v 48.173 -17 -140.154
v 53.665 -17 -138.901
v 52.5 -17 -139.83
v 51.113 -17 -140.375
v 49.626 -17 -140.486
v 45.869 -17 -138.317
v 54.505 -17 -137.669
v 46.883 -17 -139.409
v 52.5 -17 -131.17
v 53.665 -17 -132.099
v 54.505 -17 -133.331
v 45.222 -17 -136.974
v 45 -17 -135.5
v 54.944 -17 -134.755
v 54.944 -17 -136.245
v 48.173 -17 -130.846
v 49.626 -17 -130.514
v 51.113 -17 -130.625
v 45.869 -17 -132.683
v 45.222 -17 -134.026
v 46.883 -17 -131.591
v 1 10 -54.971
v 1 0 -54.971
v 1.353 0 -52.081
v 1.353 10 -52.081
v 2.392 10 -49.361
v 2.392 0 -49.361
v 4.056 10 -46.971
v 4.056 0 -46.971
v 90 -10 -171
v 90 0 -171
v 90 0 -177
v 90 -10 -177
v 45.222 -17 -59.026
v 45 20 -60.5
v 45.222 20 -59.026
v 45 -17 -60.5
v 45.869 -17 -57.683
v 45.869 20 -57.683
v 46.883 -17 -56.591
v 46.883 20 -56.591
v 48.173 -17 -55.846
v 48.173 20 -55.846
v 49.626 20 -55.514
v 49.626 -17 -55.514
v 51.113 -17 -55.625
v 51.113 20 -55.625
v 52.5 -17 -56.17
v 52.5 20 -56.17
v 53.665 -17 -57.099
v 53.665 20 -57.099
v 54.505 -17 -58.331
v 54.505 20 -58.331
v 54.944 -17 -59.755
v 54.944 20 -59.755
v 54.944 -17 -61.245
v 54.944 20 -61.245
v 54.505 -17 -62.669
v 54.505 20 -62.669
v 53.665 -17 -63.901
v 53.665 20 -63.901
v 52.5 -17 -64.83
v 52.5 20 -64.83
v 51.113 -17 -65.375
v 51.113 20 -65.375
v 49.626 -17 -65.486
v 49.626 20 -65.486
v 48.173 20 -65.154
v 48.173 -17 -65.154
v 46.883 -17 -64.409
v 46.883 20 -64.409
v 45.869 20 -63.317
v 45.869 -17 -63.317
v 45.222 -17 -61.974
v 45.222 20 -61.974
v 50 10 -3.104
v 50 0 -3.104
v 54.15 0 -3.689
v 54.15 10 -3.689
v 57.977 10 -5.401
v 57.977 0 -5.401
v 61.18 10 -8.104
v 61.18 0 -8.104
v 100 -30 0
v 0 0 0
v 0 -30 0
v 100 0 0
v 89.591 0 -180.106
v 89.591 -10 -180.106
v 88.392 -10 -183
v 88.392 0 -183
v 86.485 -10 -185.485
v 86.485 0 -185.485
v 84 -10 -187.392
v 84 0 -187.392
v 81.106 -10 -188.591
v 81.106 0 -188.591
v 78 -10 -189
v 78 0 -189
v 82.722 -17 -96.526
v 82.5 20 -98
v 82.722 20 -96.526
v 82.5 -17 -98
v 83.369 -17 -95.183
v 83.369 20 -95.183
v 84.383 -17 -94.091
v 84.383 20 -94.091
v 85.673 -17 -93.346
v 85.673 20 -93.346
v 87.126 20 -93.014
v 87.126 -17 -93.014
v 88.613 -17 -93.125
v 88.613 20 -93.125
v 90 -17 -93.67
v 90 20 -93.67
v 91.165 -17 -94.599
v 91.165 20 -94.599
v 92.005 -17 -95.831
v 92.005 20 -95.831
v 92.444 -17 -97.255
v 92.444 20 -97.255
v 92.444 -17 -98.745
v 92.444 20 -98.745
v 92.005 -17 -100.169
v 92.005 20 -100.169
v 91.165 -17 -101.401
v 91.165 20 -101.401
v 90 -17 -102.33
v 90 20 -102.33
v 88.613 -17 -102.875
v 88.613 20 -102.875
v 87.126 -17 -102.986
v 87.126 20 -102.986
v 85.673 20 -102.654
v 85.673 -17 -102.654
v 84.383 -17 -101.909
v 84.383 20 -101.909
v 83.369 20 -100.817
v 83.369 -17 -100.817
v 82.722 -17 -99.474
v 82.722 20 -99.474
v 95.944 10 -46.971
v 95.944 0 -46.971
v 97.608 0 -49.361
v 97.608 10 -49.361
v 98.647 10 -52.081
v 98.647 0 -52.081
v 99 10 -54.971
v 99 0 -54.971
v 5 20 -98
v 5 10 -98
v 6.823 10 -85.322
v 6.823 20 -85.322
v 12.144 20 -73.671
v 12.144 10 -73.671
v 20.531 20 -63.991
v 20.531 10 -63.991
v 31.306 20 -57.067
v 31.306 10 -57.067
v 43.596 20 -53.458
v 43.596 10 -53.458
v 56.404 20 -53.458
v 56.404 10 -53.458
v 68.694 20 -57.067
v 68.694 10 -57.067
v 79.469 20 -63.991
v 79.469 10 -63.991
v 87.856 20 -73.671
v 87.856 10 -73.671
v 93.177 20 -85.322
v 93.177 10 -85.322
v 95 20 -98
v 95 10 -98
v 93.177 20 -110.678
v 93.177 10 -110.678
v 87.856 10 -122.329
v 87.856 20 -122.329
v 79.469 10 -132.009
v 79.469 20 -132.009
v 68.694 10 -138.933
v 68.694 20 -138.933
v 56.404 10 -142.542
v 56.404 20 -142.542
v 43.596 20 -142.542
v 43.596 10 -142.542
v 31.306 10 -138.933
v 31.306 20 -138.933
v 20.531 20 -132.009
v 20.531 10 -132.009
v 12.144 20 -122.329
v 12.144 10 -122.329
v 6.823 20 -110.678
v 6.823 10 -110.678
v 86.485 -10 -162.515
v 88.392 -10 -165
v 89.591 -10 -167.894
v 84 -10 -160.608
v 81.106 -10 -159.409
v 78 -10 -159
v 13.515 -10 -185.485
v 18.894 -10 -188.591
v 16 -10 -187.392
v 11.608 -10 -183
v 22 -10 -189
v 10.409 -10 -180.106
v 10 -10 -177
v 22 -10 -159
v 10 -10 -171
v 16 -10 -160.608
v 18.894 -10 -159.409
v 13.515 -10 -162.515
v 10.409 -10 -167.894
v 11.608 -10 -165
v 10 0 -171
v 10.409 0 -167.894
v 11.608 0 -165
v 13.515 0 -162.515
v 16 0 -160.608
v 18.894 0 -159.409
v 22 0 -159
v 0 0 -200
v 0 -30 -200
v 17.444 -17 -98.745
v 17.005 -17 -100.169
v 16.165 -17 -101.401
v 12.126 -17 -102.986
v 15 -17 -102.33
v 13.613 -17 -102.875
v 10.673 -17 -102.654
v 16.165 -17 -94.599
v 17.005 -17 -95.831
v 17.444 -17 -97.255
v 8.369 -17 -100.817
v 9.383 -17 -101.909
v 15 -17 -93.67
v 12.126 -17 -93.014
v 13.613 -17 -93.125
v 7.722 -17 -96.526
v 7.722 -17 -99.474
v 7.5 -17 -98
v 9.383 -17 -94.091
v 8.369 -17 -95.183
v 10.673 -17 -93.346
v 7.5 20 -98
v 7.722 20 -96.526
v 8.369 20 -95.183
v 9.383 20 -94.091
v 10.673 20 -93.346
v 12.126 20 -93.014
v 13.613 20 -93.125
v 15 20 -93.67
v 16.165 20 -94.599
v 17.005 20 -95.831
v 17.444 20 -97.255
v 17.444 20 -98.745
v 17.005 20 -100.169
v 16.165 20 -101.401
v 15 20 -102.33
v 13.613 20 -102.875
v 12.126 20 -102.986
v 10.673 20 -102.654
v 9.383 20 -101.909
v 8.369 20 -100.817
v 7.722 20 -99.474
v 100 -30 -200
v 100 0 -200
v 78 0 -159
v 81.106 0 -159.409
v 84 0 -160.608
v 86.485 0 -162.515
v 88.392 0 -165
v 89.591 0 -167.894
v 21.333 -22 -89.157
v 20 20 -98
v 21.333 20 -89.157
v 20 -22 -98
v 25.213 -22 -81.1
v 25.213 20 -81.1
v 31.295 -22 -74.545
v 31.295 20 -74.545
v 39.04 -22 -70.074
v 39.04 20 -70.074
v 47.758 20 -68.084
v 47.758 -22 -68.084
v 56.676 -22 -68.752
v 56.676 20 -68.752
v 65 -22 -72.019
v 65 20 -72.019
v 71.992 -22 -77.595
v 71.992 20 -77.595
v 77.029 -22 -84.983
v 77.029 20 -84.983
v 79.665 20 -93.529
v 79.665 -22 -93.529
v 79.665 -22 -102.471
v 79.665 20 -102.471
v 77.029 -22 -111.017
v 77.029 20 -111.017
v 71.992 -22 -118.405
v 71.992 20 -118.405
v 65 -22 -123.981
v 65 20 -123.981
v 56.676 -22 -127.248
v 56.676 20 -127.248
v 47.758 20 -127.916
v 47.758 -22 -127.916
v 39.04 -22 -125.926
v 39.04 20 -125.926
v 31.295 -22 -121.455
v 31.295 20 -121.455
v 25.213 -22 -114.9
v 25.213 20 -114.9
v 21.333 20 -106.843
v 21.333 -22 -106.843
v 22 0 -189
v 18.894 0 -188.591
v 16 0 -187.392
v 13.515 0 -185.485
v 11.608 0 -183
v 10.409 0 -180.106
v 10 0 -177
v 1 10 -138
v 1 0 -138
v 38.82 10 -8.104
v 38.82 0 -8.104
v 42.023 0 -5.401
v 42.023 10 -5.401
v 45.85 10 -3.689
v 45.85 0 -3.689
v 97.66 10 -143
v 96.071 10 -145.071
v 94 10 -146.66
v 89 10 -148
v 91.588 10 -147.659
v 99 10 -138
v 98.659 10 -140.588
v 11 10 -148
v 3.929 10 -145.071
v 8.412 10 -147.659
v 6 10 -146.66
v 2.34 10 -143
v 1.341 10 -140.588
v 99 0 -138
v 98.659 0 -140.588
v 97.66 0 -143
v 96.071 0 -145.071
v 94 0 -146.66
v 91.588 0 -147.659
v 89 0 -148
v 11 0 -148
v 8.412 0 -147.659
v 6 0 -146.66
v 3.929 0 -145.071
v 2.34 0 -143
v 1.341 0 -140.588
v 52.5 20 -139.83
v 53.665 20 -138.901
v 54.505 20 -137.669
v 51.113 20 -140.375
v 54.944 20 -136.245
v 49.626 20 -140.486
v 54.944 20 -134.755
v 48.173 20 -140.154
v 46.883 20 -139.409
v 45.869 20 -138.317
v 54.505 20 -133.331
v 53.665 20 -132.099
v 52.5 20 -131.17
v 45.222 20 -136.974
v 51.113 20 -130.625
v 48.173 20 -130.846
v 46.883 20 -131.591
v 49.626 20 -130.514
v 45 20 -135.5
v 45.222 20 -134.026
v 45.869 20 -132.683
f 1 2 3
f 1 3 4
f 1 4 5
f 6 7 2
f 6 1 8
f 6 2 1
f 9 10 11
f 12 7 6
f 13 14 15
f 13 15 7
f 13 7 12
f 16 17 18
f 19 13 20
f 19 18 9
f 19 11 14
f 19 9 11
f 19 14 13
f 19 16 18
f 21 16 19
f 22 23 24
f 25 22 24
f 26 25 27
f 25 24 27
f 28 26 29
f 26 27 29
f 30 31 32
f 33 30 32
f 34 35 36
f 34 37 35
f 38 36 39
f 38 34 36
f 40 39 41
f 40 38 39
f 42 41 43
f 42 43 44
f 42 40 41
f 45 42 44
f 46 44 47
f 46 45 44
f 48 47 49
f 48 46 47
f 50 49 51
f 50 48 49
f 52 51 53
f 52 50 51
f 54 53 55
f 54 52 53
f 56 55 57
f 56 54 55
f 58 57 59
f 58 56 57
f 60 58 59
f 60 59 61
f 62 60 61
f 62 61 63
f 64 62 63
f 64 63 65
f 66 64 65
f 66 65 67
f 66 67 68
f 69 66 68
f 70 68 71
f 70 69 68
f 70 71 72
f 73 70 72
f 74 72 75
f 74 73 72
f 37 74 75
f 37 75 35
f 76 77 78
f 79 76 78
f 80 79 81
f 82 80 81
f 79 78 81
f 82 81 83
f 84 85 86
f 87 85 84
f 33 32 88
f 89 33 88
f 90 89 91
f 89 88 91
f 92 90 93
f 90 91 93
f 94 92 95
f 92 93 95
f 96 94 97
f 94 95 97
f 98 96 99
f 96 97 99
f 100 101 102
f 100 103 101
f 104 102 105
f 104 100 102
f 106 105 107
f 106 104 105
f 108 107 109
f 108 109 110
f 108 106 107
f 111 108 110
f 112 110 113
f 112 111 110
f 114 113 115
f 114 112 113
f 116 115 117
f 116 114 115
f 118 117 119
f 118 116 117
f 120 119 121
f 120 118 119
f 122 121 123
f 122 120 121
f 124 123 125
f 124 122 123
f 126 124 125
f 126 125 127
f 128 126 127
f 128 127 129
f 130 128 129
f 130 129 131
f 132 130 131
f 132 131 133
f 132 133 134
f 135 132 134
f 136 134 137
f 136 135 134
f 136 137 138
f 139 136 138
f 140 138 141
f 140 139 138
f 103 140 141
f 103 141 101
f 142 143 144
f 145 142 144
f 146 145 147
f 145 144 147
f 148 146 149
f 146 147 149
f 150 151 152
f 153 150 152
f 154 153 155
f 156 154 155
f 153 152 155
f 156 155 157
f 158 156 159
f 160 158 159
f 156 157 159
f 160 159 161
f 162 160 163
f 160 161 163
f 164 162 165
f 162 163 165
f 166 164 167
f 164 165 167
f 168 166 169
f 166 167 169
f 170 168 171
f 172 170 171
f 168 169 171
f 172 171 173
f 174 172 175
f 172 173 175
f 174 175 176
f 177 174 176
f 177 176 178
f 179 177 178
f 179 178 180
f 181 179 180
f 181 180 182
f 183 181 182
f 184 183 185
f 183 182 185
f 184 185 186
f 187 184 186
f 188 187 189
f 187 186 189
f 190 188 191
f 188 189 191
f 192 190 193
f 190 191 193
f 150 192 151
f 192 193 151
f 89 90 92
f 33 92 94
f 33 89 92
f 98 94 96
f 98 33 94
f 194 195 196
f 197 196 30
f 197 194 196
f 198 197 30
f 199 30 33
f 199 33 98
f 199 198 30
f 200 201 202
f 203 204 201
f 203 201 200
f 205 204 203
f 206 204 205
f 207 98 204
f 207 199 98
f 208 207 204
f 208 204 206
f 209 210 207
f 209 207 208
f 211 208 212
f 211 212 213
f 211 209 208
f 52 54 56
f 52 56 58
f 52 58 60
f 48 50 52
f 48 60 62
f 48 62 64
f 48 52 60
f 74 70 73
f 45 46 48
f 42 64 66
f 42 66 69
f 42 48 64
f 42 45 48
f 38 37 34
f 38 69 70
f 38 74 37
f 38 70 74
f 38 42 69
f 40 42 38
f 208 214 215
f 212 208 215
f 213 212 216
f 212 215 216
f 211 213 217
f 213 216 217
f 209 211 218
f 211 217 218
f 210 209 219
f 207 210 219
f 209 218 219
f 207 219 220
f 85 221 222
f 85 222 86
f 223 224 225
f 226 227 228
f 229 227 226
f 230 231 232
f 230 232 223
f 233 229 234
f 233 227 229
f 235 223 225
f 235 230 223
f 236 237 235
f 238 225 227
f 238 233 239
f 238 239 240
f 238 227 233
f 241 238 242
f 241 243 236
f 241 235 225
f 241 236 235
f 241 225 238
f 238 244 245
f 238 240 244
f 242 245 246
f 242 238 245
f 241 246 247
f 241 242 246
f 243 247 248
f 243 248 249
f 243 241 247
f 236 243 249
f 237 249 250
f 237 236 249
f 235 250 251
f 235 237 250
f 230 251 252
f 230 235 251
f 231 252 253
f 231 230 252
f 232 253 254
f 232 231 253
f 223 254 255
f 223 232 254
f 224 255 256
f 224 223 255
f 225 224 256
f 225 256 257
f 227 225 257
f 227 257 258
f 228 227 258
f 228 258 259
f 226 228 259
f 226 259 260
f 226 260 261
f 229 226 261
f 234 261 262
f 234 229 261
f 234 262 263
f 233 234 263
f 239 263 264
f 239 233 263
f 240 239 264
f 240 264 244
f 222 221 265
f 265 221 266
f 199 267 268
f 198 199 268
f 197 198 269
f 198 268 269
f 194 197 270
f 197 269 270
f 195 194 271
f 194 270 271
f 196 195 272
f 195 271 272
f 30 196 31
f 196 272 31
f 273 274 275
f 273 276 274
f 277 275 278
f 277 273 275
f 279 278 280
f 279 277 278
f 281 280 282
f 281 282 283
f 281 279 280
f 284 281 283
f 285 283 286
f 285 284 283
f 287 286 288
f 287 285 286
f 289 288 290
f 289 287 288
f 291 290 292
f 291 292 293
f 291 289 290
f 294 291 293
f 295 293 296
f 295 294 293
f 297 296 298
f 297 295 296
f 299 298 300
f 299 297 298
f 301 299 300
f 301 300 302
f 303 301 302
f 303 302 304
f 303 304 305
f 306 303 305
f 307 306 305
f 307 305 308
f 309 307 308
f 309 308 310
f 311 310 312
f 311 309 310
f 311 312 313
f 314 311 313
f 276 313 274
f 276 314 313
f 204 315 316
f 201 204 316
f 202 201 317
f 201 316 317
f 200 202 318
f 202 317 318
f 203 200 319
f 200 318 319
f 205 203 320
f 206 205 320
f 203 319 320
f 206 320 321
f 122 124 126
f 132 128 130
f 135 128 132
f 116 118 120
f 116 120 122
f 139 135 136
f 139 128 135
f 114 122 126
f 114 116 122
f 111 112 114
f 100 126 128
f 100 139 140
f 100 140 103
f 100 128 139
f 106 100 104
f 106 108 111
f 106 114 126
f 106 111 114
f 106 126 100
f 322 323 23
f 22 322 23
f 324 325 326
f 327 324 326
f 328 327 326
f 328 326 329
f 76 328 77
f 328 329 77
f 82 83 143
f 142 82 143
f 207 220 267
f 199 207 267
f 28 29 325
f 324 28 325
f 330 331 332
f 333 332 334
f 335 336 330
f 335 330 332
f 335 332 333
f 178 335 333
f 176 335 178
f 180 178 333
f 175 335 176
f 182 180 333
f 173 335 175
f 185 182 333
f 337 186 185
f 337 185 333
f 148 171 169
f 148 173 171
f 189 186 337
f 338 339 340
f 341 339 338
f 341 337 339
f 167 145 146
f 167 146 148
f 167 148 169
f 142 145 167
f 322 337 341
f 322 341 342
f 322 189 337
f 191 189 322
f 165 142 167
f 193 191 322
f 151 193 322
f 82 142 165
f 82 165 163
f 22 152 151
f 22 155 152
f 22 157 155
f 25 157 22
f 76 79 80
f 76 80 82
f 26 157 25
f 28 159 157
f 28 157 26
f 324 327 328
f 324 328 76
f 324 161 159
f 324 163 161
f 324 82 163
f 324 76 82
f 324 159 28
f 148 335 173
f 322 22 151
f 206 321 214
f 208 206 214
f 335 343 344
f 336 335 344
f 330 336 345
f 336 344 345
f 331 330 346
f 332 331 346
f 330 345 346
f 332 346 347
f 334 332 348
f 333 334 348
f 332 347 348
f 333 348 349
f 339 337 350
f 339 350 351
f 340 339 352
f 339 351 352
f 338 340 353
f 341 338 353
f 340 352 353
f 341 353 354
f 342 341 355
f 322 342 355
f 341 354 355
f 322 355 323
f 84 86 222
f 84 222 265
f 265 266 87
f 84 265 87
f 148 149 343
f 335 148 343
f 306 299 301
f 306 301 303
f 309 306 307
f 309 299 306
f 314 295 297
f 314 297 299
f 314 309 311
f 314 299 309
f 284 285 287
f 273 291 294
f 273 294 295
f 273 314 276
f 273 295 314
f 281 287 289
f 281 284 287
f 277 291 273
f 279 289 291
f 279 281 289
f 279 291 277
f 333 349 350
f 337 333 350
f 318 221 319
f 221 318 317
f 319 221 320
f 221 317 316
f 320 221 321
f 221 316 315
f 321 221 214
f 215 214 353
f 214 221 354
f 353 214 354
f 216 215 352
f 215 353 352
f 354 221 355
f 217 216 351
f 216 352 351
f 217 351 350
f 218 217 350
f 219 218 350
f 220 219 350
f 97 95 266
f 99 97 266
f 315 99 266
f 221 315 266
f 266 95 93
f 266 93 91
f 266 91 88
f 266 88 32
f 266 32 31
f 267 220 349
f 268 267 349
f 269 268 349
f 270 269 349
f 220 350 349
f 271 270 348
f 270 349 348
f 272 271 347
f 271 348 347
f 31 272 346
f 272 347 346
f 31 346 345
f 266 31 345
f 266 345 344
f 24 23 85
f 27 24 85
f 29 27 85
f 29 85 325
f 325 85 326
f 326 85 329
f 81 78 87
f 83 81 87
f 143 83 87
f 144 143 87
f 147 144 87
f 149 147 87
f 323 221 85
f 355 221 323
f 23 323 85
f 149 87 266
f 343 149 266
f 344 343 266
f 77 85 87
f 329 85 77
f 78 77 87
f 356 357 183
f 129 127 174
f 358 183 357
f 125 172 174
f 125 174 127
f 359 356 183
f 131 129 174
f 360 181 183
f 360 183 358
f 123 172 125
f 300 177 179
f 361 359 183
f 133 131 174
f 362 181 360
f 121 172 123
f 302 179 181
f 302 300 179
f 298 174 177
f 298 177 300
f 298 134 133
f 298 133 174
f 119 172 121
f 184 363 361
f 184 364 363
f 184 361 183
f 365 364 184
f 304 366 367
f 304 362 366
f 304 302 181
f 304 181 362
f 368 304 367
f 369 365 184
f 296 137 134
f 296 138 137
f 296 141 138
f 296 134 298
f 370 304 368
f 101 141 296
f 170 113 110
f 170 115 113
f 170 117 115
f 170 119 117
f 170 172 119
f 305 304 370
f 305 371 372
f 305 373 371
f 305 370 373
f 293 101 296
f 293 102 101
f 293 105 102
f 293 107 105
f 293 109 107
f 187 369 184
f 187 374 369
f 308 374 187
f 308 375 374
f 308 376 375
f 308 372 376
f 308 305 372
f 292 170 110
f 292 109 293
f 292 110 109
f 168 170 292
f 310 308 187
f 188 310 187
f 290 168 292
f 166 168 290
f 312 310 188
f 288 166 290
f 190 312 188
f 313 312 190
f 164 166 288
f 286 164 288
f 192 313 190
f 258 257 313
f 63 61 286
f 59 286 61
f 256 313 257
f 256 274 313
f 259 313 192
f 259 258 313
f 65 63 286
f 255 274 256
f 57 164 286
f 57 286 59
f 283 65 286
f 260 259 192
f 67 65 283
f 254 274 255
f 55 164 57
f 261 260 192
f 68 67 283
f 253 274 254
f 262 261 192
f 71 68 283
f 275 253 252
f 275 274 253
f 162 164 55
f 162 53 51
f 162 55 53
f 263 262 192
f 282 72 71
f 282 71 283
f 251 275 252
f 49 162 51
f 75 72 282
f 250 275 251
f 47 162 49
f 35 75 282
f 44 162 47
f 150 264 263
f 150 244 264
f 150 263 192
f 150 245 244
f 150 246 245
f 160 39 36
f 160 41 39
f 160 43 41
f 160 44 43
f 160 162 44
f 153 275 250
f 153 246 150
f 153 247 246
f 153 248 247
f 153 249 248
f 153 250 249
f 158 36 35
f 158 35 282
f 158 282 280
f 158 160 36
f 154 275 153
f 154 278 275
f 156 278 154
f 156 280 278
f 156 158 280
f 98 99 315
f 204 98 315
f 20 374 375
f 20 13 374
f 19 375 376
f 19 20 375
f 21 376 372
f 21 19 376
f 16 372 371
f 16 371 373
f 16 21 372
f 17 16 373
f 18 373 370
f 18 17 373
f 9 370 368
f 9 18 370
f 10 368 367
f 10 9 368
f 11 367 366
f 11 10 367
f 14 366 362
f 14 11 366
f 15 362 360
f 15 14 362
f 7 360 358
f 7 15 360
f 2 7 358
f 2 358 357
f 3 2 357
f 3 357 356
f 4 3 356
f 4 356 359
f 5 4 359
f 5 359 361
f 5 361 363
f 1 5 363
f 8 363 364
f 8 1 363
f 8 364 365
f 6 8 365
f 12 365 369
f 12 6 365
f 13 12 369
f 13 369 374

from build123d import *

# Parameters (mm, degrees)
F0_W     = 100
F0_H     = 200
F1_DEPTH = 30
F3_DEPTH = 10
F4_R     = 45
F4_R_2   = 5
F4_R_3   = 30
F5_DEPTH = 10
F6_DEPTH = 27
F7_DEPTH = 32
F9_DEPTH = 10


with BuildPart() as f1:
    # F0 (on Front) → F1 (new body)
    with BuildSketch(Plane.XZ):
        with Locations((50, -100)):
            Rectangle(F0_W, F0_H)
    extrude(amount=F1_DEPTH)

    # F2 (on face) → F3 (join)
    with BuildSketch(Plane(origin=(0, 0, 0), x_dir=(-1, 0, 0), z_dir=(0, 1, 0))):
        with BuildLine():
            ThreePointArc((-38.8196601125, -8.1037424163), (-43.876275643, -4.4106784786), (-50, -3.1037424163))
            ThreePointArc((-50, -3.1037424163), (-56.123724357, -4.4106784786), (-61.1803398875, -8.1037424163))
            Line((-61.1803398875, -8.1037424163), (-95.94427191, -46.971))
            ThreePointArc((-95.94427191, -46.971), (-98.2100683076, -50.6891349227), (-99, -54.971))
            Line((-99, -54.971), (-99, -138))
            ThreePointArc((-99, -138), (-96.0710678119, -145.0710678119), (-89, -148))
            Line((-89, -148), (-50, -148))
            Line((-50, -148), (-11, -148))
            ThreePointArc((-11, -148), (-3.9289321881, -145.0710678119), (-1, -138))
            Line((-1, -138), (-1, -54.971))
            ThreePointArc((-1, -54.971), (-1.7899316924, -50.6891349227), (-4.05572809, -46.971))
            Line((-4.05572809, -46.971), (-38.8196601125, -8.1037424163))
        make_face()
    extrude(amount=F3_DEPTH)

    # F4 (on face) → F5 (join)
    with BuildSketch(Plane(origin=(0, 10, 0), x_dir=(-1, 0, 0), z_dir=(0, 1, 0))):
        with Locations((-50, -98)):
            Circle(F4_R)
        with Locations((-50, -135.5)):
            Circle(F4_R_2, mode=Mode.SUBTRACT)
        with Locations((-87.5, -98)):
            Circle(F4_R_2, mode=Mode.SUBTRACT)
        with Locations((-50, -98)):
            Circle(F4_R_3, mode=Mode.SUBTRACT)
        with Locations((-12.5, -98)):
            Circle(F4_R_2, mode=Mode.SUBTRACT)
        with Locations((-50, -60.5)):
            Circle(F4_R_2, mode=Mode.SUBTRACT)
    extrude(amount=F5_DEPTH)

    # F6 (cut): faces of the model
    f6_faces = [f1.faces().sort_by_distance(p)[0] for p in [
        (50, 10, -135.5),
        (87.5, 10, -98),
        (50, 10, -60.5),
        (12.5, 10, -98),
    ]]
    extrude(f6_faces, amount=-F6_DEPTH, mode=Mode.SUBTRACT)

    # F7 (cut): a face of the model
    f7_faces = [f1.faces().sort_by_distance(p)[0] for p in [
        (50, 10, -98),
    ]]
    extrude(f7_faces, amount=-F7_DEPTH, mode=Mode.SUBTRACT)

    # F8 (on face) → F9 (cut)
    with BuildSketch(Plane(origin=(0, 0, 0), x_dir=(-1, 0, 0), z_dir=(0, 1, 0))):
        with BuildLine():
            ThreePointArc((-90, -177), (-86.4852813742, -185.4852813742), (-78, -189))
            Line((-78, -189), (-22, -189))
            ThreePointArc((-22, -189), (-13.5147186258, -185.4852813742), (-10, -177))
            Line((-10, -177), (-10, -171))
            ThreePointArc((-10, -171), (-13.5147186258, -162.5147186258), (-22, -159))
            Line((-22, -159), (-78, -159))
            ThreePointArc((-78, -159), (-86.4852813742, -162.5147186258), (-90, -171))
            Line((-90, -171), (-90, -177))
        make_face()
    extrude(amount=-F9_DEPTH, mode=Mode.SUBTRACT)


solid = f1.part
